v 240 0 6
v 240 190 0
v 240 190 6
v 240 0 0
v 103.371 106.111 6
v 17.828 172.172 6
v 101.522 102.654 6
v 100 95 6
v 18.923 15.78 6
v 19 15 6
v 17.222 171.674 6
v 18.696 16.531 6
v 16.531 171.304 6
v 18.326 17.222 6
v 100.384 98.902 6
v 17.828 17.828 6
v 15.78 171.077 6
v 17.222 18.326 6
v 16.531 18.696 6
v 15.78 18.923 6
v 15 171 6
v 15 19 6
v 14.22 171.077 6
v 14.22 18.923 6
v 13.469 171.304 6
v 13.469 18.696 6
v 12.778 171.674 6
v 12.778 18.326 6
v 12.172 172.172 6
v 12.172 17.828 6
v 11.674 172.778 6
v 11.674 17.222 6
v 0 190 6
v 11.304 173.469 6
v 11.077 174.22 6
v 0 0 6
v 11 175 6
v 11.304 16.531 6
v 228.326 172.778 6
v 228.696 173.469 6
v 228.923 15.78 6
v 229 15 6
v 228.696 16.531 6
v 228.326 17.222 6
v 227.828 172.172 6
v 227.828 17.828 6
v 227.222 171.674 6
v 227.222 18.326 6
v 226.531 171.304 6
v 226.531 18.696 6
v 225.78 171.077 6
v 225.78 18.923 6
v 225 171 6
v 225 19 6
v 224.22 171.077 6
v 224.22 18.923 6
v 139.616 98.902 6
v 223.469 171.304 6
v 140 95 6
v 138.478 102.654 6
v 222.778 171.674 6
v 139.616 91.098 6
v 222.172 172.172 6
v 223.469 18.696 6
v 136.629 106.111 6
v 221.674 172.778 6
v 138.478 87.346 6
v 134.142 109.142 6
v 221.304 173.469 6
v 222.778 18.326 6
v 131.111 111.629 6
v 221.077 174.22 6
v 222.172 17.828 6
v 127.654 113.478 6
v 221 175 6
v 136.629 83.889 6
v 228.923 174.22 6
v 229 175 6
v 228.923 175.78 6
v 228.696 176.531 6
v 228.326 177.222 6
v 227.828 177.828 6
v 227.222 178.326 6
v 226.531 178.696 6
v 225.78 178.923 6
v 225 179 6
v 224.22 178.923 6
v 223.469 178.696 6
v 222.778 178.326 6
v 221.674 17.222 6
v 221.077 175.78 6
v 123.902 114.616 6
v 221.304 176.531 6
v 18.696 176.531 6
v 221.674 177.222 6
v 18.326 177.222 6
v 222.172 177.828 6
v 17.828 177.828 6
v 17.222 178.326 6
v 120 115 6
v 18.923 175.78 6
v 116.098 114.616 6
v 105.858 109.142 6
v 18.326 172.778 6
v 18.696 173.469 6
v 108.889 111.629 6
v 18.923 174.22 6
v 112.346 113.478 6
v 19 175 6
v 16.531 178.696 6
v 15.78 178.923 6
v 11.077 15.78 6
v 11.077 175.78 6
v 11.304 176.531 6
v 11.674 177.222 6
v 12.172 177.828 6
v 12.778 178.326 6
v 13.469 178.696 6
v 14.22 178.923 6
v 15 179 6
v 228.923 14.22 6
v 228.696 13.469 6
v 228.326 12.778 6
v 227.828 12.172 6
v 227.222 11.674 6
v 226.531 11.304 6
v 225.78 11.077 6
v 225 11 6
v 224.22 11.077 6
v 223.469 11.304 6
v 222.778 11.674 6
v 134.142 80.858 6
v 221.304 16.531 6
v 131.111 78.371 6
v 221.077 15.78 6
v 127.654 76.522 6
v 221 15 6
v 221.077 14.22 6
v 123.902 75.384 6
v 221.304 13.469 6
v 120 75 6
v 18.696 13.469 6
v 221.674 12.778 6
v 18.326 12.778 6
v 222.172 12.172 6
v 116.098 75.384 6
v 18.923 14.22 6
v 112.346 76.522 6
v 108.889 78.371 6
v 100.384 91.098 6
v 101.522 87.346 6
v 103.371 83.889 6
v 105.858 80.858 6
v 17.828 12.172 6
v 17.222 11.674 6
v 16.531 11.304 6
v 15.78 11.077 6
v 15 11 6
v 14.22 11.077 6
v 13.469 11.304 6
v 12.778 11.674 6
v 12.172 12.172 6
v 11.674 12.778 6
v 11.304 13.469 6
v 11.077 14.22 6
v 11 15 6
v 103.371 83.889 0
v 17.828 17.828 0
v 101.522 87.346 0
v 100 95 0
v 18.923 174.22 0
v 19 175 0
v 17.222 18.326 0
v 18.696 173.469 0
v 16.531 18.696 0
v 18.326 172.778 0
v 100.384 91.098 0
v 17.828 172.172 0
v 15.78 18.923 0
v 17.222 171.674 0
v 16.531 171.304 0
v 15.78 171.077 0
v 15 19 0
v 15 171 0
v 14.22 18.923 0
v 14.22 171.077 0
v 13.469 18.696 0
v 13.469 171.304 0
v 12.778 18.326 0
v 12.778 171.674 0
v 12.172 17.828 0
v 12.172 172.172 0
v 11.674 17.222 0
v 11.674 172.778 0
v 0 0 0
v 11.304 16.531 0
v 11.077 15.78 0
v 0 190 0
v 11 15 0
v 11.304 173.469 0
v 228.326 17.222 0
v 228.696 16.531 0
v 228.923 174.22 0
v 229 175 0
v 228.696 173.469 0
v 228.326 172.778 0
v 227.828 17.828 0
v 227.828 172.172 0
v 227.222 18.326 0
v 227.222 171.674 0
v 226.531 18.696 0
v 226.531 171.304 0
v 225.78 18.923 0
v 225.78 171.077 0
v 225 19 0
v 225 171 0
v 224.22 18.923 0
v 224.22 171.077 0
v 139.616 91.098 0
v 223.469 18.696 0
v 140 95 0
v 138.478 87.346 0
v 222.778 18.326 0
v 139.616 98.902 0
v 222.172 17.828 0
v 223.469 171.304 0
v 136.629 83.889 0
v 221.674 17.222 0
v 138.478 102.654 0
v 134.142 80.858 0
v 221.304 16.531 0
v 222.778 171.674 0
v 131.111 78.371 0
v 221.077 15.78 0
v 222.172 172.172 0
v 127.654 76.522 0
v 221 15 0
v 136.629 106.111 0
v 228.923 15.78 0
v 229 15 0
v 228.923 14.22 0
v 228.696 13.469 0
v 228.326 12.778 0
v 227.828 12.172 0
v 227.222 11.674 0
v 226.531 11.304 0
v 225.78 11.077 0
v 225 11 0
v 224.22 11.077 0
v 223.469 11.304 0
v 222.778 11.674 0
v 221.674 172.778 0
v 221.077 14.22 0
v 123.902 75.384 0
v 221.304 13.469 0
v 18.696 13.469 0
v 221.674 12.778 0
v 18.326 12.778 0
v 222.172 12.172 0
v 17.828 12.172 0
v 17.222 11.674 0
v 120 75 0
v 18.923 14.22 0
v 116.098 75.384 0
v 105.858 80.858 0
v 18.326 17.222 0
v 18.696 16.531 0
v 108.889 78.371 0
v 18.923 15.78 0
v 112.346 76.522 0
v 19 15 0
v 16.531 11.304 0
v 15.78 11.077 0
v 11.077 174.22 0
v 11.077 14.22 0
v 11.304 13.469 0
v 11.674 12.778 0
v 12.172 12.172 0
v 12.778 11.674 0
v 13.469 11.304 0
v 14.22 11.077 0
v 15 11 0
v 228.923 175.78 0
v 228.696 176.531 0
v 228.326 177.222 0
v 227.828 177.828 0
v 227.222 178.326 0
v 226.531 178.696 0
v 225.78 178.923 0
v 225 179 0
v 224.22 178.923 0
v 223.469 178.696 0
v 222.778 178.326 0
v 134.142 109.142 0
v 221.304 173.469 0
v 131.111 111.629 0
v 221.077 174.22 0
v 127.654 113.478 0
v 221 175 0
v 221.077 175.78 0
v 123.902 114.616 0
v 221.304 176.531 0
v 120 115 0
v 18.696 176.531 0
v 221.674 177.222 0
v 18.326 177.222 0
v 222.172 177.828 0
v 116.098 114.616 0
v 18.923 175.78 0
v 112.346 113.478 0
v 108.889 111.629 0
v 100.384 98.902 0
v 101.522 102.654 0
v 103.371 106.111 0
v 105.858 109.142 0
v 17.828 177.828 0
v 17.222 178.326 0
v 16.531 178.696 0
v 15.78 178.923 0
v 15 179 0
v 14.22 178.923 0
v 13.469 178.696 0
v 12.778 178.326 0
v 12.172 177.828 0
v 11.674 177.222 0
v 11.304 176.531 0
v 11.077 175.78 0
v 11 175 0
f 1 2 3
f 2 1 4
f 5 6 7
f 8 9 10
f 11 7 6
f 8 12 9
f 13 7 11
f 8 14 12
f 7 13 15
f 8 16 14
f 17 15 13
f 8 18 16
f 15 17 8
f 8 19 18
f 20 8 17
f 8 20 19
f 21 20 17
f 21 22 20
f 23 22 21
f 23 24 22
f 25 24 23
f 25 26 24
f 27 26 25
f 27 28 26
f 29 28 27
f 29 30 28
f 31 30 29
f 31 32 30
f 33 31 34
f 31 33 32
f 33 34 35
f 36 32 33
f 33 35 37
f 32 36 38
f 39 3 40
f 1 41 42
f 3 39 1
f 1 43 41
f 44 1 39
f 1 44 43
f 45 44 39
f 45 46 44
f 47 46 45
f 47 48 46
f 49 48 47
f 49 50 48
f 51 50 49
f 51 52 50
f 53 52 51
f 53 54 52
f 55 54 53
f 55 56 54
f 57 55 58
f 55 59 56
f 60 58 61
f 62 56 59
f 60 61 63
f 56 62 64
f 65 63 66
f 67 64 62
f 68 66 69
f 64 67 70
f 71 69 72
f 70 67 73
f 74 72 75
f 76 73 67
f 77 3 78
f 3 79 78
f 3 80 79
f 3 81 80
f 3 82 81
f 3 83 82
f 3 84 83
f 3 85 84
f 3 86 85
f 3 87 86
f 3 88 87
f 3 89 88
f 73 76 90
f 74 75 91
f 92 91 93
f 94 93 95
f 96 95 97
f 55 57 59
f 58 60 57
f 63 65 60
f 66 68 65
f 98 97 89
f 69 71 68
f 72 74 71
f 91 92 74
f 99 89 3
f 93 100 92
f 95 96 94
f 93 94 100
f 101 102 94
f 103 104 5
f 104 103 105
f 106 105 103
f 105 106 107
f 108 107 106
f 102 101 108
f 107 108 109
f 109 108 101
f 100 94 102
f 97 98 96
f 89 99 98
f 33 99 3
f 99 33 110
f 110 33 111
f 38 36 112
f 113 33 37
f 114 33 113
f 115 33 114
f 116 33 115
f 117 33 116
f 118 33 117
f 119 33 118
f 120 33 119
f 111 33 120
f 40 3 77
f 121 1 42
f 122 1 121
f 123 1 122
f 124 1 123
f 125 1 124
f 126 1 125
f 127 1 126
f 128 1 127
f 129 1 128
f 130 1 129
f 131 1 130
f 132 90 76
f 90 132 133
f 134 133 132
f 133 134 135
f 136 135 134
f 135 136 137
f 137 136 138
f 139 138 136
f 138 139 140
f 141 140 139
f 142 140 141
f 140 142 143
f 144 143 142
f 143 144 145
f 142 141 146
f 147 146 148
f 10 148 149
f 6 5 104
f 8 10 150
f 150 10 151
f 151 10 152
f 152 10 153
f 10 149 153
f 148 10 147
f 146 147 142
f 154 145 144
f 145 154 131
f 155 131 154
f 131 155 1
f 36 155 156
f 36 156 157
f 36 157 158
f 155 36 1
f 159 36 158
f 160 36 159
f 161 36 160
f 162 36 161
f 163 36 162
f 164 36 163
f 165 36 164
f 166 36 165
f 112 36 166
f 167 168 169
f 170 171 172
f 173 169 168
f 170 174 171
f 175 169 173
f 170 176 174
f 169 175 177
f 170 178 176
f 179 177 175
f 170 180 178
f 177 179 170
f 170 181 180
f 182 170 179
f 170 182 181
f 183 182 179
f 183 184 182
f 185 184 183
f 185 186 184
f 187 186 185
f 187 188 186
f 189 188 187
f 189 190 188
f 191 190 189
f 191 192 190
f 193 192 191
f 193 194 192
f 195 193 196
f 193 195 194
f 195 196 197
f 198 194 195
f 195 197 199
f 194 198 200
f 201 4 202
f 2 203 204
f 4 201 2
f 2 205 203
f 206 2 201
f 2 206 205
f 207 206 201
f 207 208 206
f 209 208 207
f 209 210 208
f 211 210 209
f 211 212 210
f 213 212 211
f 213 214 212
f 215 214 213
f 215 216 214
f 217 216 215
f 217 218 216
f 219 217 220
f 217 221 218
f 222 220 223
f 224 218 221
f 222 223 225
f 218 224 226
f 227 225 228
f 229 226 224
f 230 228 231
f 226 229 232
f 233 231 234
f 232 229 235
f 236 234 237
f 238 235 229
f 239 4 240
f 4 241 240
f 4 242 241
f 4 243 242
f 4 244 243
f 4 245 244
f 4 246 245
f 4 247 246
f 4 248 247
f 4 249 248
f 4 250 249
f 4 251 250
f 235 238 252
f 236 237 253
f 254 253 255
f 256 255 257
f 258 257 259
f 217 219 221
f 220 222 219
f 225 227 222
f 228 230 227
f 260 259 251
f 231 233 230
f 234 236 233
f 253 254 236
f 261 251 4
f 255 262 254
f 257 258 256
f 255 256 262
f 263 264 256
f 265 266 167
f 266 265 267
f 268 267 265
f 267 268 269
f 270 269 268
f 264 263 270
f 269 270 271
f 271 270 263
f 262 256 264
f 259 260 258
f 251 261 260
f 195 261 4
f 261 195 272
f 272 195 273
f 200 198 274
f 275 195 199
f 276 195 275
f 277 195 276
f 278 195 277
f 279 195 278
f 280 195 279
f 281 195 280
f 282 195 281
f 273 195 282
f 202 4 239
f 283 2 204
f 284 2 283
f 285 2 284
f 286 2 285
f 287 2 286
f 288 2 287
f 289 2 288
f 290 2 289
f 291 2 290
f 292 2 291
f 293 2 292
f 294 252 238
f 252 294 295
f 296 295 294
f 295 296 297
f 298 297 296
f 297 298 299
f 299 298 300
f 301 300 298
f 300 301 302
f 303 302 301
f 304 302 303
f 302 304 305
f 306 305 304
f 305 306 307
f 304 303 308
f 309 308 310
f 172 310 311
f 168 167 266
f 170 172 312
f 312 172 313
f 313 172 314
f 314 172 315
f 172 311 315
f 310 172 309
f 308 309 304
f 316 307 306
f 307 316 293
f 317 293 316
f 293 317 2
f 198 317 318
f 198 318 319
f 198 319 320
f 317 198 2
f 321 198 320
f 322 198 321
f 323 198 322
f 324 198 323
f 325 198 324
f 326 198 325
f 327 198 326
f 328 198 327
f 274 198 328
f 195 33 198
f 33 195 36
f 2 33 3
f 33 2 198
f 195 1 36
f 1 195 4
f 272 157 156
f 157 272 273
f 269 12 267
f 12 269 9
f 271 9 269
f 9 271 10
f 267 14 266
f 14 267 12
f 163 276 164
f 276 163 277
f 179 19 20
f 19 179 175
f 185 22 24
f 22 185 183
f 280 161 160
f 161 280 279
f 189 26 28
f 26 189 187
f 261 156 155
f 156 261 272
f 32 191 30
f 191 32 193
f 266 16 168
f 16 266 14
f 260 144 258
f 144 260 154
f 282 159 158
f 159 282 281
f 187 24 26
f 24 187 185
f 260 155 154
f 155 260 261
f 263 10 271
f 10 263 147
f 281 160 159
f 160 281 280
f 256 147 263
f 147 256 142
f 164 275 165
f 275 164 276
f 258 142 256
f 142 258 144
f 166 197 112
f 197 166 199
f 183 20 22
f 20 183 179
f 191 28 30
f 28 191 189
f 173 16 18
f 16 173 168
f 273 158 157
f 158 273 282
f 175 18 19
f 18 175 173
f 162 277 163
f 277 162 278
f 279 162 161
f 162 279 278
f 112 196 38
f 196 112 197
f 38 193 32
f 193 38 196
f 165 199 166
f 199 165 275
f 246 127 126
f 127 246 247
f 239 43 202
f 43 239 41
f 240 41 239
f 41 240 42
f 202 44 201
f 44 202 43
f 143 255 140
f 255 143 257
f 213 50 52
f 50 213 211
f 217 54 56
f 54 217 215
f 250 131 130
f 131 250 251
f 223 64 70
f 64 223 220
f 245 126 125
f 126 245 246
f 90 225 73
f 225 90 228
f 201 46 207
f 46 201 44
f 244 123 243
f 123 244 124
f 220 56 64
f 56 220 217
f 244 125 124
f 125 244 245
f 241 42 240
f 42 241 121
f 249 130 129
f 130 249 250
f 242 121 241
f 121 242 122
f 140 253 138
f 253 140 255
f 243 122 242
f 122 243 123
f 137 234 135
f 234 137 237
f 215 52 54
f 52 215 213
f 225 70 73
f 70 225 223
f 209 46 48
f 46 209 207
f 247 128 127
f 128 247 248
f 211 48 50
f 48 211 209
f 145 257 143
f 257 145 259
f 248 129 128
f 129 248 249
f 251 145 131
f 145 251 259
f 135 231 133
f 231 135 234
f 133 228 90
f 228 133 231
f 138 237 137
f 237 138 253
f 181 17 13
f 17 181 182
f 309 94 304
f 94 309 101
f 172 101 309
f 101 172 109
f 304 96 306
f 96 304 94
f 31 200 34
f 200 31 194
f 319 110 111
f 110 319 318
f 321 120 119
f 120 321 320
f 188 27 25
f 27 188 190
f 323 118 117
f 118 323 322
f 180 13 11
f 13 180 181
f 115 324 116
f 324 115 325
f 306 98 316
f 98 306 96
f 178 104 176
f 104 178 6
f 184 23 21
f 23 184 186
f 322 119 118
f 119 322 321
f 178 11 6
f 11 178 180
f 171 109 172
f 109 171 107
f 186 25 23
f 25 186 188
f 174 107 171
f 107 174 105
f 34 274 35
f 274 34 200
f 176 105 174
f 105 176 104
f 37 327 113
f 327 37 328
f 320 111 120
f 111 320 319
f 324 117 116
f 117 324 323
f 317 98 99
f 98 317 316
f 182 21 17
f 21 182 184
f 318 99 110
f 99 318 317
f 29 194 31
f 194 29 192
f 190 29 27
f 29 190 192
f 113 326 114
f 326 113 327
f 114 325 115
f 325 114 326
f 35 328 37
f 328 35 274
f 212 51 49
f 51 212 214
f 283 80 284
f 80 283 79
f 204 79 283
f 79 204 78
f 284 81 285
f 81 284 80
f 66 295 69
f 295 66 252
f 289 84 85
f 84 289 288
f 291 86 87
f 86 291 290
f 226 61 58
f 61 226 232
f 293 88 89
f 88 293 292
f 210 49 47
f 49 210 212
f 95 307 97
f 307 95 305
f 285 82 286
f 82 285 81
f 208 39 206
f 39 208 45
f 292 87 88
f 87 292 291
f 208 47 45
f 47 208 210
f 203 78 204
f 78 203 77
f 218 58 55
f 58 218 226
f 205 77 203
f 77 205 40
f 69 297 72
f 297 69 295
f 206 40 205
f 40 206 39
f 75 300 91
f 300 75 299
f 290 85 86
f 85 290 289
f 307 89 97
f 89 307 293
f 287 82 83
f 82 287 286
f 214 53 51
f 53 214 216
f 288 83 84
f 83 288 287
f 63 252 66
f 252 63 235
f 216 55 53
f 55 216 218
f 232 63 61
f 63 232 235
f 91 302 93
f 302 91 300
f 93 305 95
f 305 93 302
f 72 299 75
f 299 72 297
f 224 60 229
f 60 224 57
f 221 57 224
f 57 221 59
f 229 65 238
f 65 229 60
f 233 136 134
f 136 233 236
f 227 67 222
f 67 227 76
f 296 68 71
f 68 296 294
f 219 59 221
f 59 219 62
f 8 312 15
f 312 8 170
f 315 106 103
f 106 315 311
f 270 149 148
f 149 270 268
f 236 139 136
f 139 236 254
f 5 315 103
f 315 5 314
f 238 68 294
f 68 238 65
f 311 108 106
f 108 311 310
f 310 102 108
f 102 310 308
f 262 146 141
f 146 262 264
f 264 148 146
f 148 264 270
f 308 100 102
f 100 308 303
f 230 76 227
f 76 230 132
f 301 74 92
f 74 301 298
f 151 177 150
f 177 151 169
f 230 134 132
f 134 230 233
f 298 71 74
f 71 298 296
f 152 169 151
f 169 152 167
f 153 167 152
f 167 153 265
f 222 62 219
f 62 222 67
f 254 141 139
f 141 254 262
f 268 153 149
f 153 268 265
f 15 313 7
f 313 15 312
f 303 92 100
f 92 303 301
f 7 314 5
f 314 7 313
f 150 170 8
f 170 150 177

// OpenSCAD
$fn = 32;

// ----------------------------------------------------------------------
// Big plate: 200-250 mm adapter plate
// ----------------------------------------------------------------------

// --- parameters (mm) ---
plate_l = 240;            // plate length, X
plate_w = 190;            // plate width, Y
plate_t = 6;              // plate thickness, Z
corner_d = 8;             // corner hole diameter
corner_in = 15;           // corner hole inset from the edges
bore_d = 40;              // central bore

difference() {
  cube([plate_l, plate_w, plate_t]);
  translate([corner_in, corner_in, -1]) cylinder(h = plate_t + 2, d = corner_d);
  translate([plate_l - corner_in, corner_in, -1]) cylinder(h = plate_t + 2, d = corner_d);
  translate([corner_in, plate_w - corner_in, -1]) cylinder(h = plate_t + 2, d = corner_d);
  translate([plate_l - corner_in, plate_w - corner_in, -1]) cylinder(h = plate_t + 2, d = corner_d);
  translate([plate_l / 2, plate_w / 2, -1]) cylinder(h = plate_t + 2, d = bore_d);
}
